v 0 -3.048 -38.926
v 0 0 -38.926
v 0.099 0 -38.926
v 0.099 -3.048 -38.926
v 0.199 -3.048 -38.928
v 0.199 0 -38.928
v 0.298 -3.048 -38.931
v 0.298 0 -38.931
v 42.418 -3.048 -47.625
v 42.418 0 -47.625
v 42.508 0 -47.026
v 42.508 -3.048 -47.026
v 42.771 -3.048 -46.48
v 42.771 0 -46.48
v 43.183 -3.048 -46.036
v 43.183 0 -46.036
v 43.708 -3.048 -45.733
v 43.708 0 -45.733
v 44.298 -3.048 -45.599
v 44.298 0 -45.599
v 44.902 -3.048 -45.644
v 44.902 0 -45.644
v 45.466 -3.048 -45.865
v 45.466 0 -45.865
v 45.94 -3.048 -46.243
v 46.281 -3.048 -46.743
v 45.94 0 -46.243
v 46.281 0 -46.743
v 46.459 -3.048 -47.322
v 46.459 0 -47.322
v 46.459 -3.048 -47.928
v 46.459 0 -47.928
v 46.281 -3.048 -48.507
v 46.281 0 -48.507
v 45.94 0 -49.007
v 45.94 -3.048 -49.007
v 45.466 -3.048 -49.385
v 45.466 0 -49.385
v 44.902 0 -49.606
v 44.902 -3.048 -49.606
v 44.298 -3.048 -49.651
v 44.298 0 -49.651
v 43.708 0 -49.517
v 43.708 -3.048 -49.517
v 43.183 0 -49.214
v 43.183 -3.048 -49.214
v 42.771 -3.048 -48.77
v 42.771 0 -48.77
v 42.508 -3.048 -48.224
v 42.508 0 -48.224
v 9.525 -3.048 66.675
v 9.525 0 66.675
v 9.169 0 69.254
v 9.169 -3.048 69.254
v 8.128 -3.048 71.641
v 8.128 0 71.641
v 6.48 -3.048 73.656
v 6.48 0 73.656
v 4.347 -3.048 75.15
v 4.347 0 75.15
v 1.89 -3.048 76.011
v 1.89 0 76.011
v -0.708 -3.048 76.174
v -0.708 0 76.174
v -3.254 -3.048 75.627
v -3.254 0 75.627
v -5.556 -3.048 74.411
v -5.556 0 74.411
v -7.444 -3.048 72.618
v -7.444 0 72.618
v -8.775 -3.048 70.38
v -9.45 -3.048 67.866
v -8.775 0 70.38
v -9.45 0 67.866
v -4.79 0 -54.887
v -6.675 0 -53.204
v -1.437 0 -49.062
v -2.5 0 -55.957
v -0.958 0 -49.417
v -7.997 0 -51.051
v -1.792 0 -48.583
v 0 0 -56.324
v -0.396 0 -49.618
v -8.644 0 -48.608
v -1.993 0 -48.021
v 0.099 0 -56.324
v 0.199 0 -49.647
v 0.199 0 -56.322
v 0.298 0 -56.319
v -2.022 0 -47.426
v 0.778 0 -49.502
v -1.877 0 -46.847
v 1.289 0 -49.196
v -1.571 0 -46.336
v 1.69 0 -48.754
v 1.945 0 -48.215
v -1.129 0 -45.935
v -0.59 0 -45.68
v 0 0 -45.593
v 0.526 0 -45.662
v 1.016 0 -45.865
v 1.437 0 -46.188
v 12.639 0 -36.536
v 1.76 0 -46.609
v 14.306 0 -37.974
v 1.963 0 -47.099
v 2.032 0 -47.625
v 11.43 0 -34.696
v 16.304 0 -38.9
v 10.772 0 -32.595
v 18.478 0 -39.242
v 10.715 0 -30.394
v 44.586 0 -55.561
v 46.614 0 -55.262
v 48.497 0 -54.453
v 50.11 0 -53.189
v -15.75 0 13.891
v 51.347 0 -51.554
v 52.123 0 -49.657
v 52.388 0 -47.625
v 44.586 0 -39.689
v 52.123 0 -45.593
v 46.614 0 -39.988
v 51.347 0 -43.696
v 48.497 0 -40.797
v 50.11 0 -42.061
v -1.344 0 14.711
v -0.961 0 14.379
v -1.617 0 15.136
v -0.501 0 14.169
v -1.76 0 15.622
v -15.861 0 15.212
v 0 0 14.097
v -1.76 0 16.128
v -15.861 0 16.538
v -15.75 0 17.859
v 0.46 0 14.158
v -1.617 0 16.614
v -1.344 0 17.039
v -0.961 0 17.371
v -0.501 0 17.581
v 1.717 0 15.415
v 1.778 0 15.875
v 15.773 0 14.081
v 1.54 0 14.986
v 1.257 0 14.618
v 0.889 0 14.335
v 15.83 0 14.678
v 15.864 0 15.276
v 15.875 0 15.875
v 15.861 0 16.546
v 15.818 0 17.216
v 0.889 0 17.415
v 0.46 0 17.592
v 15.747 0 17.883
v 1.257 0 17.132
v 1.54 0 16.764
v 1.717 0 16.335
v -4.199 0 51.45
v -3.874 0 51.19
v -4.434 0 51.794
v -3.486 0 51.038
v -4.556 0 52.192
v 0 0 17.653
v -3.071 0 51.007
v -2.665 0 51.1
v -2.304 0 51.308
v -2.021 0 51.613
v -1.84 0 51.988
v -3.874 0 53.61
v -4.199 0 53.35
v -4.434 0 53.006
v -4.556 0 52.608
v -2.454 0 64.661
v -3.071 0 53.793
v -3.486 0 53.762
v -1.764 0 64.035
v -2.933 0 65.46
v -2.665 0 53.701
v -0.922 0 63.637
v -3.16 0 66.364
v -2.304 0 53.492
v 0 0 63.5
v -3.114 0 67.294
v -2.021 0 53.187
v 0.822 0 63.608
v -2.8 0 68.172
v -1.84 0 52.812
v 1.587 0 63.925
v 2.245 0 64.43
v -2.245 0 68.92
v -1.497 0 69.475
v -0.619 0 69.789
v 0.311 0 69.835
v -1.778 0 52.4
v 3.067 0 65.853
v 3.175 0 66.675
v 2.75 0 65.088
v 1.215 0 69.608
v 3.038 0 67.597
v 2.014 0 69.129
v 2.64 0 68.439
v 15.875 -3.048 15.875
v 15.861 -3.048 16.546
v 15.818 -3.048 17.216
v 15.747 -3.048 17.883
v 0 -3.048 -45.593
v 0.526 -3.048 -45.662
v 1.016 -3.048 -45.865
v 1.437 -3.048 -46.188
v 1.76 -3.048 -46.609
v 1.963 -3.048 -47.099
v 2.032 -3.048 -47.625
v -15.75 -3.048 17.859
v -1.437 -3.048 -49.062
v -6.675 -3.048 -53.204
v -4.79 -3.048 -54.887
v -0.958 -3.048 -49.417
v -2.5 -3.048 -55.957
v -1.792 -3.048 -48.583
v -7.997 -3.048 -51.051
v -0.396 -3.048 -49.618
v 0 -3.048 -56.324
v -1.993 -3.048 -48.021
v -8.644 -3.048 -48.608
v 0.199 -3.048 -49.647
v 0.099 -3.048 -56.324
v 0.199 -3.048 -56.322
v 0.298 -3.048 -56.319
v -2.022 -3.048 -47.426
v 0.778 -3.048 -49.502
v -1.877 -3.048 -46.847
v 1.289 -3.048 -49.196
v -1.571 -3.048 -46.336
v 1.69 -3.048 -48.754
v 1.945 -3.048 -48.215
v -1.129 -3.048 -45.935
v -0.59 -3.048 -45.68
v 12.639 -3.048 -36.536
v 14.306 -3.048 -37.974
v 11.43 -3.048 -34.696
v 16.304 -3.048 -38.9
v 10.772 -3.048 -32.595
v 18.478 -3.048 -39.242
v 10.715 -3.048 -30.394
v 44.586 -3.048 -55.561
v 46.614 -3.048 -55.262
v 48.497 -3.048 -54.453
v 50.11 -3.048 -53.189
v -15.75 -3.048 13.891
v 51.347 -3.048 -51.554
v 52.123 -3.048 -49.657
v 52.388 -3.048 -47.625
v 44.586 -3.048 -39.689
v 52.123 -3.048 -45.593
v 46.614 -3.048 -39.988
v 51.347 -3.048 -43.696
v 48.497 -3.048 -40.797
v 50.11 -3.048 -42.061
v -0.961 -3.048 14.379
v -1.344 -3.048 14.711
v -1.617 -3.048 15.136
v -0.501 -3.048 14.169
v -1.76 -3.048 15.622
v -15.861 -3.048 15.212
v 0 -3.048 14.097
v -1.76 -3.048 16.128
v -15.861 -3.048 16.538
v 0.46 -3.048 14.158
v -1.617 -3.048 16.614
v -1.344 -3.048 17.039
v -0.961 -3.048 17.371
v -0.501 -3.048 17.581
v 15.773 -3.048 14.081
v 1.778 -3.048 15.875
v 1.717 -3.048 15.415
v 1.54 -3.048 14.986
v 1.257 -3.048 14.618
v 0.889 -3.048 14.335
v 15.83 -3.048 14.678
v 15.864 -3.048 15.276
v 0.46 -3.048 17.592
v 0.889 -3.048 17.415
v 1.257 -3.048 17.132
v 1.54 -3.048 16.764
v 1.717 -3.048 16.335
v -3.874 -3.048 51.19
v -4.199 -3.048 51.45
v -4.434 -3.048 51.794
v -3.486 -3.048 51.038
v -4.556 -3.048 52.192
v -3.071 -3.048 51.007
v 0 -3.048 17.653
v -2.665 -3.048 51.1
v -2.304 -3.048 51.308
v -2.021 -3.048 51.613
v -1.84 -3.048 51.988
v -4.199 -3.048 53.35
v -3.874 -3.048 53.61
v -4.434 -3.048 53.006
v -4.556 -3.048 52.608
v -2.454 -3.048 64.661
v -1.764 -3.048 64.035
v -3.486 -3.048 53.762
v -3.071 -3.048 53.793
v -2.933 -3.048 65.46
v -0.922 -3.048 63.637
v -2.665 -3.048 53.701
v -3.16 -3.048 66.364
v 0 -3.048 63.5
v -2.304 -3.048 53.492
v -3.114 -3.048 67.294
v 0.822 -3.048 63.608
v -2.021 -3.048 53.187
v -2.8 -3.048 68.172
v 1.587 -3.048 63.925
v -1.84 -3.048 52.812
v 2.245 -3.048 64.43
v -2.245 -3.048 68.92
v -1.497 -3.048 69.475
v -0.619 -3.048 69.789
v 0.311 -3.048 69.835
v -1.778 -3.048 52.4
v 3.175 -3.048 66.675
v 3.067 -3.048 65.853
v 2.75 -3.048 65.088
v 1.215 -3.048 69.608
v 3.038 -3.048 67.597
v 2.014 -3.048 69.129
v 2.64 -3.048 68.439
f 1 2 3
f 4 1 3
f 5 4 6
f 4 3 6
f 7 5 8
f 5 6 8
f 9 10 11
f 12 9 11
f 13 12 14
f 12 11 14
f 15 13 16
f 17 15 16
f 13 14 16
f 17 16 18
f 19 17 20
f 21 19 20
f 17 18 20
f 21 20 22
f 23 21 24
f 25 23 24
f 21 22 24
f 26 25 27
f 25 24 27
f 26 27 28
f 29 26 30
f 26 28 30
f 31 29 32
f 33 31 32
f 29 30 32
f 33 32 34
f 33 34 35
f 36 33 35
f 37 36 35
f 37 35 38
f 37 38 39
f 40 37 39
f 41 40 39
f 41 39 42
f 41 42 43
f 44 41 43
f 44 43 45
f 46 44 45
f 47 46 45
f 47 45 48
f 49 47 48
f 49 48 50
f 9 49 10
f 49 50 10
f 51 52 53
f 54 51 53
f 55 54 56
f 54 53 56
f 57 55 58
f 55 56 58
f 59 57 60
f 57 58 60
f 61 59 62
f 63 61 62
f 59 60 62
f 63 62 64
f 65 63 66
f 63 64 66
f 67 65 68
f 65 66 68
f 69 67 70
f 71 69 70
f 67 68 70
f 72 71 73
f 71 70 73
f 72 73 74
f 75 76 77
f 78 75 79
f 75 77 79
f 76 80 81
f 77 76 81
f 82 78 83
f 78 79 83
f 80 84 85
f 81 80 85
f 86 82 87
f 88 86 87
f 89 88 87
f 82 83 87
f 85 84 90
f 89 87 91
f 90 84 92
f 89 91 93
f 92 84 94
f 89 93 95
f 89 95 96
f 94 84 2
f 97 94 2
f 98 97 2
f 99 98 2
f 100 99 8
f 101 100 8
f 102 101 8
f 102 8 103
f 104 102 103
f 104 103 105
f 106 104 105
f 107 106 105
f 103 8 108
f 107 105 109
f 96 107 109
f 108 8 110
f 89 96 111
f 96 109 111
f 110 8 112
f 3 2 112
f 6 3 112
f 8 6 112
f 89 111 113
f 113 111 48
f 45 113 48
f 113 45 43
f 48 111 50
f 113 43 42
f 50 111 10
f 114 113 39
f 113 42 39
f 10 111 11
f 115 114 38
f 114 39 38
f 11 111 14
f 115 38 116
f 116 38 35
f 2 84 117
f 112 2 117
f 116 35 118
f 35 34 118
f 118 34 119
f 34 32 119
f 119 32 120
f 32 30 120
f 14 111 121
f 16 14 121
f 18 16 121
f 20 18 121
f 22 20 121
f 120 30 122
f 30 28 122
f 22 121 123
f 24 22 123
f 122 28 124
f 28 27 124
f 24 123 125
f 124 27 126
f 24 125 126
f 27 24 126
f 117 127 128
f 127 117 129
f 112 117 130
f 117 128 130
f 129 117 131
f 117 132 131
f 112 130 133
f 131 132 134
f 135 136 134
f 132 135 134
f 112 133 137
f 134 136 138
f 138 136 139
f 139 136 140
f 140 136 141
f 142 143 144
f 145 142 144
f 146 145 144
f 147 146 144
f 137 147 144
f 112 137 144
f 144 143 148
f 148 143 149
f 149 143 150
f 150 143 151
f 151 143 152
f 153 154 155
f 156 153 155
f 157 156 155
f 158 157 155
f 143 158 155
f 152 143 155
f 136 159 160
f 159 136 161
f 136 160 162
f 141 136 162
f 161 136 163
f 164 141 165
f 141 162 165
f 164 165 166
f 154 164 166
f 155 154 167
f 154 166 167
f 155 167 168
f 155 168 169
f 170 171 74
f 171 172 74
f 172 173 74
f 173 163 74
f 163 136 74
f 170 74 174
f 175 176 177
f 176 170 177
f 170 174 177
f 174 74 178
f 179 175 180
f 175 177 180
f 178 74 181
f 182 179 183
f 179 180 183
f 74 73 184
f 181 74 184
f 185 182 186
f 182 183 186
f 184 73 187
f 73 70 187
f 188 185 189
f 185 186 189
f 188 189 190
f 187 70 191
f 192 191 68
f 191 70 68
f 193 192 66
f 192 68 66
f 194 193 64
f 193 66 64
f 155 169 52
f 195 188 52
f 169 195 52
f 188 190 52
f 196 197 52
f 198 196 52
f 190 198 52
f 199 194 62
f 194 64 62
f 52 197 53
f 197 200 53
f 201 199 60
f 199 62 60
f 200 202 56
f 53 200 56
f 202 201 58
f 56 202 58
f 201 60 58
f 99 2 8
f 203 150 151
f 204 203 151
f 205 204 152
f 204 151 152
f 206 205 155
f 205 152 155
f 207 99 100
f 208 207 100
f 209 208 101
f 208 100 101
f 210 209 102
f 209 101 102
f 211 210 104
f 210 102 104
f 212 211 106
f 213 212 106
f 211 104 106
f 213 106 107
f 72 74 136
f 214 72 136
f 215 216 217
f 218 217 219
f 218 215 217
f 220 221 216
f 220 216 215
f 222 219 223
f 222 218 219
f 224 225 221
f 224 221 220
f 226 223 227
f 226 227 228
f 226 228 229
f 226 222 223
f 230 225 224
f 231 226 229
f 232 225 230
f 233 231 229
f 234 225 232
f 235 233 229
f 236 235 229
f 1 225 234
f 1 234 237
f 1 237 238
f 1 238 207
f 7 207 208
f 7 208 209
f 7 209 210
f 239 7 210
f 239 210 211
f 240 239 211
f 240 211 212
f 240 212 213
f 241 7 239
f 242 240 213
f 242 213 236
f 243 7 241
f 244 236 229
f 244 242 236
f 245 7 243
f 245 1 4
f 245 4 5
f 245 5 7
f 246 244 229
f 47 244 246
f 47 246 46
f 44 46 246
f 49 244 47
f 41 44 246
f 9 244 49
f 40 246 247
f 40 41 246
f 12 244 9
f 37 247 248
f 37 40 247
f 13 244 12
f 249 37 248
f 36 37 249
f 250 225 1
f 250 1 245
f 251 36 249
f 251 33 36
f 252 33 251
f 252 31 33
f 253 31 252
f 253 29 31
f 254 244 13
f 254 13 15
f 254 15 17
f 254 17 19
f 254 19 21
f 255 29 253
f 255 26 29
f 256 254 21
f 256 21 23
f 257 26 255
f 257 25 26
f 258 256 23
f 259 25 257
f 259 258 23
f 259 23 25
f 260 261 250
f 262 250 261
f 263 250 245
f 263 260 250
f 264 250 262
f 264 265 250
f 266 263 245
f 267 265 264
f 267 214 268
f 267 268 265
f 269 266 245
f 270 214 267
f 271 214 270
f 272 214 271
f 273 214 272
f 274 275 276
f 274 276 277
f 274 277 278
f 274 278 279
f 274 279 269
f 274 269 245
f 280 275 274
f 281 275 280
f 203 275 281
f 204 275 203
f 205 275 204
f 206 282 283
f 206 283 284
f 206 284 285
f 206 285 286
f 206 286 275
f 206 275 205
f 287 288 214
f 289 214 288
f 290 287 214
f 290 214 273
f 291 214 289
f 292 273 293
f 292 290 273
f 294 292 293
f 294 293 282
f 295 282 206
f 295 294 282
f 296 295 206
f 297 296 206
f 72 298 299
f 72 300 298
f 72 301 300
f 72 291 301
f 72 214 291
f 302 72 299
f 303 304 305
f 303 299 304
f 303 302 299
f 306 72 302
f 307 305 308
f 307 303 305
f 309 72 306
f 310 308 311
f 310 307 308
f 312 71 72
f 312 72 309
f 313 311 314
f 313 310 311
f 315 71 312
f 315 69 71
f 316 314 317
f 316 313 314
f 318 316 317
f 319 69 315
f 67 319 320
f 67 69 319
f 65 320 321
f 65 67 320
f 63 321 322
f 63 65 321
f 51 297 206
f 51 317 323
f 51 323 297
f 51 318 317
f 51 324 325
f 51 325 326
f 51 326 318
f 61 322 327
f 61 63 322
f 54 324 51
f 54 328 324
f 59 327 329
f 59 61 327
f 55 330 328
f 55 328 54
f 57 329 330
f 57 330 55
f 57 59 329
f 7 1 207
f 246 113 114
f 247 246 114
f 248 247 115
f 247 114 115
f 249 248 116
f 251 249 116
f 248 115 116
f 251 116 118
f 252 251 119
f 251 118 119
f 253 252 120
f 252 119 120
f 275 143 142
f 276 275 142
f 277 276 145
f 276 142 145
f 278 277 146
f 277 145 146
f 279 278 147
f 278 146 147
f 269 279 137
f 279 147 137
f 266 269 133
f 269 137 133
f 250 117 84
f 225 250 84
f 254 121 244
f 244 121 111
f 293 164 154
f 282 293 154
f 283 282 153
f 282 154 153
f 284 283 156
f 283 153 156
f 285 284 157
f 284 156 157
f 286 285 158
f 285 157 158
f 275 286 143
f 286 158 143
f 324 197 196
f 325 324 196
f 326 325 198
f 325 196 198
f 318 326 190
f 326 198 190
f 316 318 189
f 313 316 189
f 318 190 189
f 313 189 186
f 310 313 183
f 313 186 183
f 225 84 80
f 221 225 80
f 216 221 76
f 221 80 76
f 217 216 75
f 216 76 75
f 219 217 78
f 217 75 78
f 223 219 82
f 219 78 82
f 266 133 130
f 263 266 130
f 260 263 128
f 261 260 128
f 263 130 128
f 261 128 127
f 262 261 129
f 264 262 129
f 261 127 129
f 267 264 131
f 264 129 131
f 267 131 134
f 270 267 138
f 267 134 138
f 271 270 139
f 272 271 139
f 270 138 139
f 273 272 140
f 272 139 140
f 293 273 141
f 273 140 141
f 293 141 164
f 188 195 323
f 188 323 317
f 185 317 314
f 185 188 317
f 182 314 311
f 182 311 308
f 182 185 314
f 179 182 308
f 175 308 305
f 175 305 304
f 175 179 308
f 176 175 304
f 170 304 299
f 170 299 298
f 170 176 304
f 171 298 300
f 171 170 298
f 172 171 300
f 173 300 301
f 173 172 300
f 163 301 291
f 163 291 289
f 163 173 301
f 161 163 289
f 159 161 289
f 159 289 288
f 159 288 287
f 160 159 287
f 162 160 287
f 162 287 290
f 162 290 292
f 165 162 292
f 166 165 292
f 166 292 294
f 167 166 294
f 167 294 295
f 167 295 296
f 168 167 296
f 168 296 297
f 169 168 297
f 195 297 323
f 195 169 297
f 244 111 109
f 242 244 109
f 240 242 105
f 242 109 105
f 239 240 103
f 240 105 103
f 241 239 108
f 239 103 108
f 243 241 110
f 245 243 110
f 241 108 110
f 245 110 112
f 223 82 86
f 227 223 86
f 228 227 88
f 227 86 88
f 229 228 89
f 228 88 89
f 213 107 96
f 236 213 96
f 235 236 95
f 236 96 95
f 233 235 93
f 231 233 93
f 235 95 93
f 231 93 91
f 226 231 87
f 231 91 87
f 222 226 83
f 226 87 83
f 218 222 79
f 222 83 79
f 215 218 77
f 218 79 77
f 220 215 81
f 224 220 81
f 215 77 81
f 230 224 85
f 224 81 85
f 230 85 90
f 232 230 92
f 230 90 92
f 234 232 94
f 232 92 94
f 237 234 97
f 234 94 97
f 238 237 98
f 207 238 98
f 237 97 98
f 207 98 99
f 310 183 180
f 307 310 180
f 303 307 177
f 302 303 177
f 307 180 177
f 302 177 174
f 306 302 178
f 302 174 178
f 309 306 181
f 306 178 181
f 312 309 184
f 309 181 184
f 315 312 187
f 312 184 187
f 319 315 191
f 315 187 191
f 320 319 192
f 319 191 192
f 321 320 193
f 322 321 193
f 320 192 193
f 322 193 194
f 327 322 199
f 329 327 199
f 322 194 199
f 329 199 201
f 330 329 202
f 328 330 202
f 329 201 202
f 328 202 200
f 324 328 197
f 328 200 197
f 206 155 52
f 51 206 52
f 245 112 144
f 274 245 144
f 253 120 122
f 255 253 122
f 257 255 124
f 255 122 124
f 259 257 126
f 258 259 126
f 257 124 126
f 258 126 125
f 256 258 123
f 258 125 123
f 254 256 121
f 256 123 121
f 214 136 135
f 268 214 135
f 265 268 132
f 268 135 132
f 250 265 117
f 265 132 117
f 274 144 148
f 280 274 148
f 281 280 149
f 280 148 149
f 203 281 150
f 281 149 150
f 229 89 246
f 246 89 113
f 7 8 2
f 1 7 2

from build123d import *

# Parameters (mm, degrees)
F0_R     = 1.397
F1_DEPTH = 3.048


with BuildPart() as f1:
    # F0 (on Front) → F1 (new body)
    with BuildSketch(Plane.XZ):
        with BuildLine():
            ThreePointArc((3.175, 66.675), (-2.245064, 68.920064), (0, 63.5))
            ThreePointArc((0, 63.5), (2.245064, 64.429936), (3.175, 66.675))
        make_face()
        with BuildLine():
            ThreePointArc((0, 57.15), (6.735192, 59.939808), (9.525, 66.675))
            ThreePointArc((9.525, 66.675), (0.596483, 76.181305), (-9.450293, 67.865625))
            ThreePointArc((-9.450293, 67.865625), (-7.14375, 60.374805), (0, 57.15))
        make_face()
        with BuildLine():
            ThreePointArc((3.175, 66.675), (2.245064, 64.429936), (0, 63.5))
            ThreePointArc((0, 63.5), (-2.245064, 68.920064), (3.175, 66.675))
        make_face(mode=Mode.SUBTRACT)
        with BuildLine():
            Line((15.747457, 17.883289), (9.525, 66.675))
            ThreePointArc((9.525, 66.675), (6.735192, 59.939808), (0, 57.15))
            Line((0, 57.15), (0, 31.75))
            ThreePointArc((0, 31.75), (10.491283, 27.789219), (15.747457, 17.883289))
        make_face()
        with BuildLine():
            ThreePointArc((0, 57.15), (-7.14375, 60.374805), (-9.450293, 67.865625))
            Line((-9.450293, 67.865625), (-15.750488, 17.859375))
            ThreePointArc((-15.750488, 17.859375), (-10.500326, 27.78125), (0, 31.75))
            Line((0, 31.75), (0, 57.15))
        make_face()
        with Locations((-3.175, 52.4002)):
            Circle(F0_R, mode=Mode.SUBTRACT)
        with BuildLine():
            ThreePointArc((15.875, 15.875), (15.843082, 16.881168), (15.747457, 17.883289))
            ThreePointArc((15.747457, 17.883289), (10.491283, 27.789219), (0, 31.75))
            Line((0, 31.75), (0, 17.653))
            ThreePointArc((0, 17.653), (1.257236, 17.132236), (1.778, 15.875))
            ThreePointArc((1.778, 15.875), (1.257236, 14.617764), (0, 14.097))
            Line((0, 14.097), (0, 0))
            ThreePointArc((0, 0), (10.572083, 4.03242), (15.77332, 14.081125))
            ThreePointArc((15.77332, 14.081125), (15.84956, 14.976623), (15.875, 15.875))
        make_face()
        with BuildLine():
            ThreePointArc((0, 31.75), (-10.500326, 27.78125), (-15.750488, 17.859375))
            ThreePointArc((-15.750488, 17.859375), (-15.875, 15.875), (-15.750488, 13.890625))
            ThreePointArc((-15.750488, 13.890625), (-10.500326, 3.96875), (0, 0))
            Line((0, 0), (0, 14.097))
            ThreePointArc((0, 14.097), (-1.778, 15.875), (0, 17.653))
            Line((0, 17.653), (0, 31.75))
        make_face()
        with BuildLine():
            ThreePointArc((0, 0), (-10.500326, 3.96875), (-15.750488, 13.890625))
            Line((-15.750488, 13.890625), (-8.643798, -48.607884))
            ThreePointArc((-8.643798, -48.607884), (-6.48968, -41.831439), (0, -38.9255))
            Line((0, -38.9255), (0, 0))
        make_face()
        with BuildLine():
            Line((10.715191, -30.394381), (15.77332, 14.081125))
            ThreePointArc((15.77332, 14.081125), (10.572083, 4.03242), (0, 0))
            Line((0, 0), (0, -38.9255))
            ThreePointArc((0, -38.9255), (0.148885, -38.926774), (0.297726, -38.930596))
            ThreePointArc((0.297726, -38.930596), (6.255852, -41.579703), (8.6995, -47.625))
            Line((8.6995, -47.625), (36.5125, -47.625))
            ThreePointArc((36.5125, -47.625), (38.885575, -41.964516), (44.585844, -39.688663))
            Line((44.585844, -39.688663), (18.478408, -39.241789))
            ThreePointArc((18.478408, -39.241789), (12.638616, -36.536307), (10.715191, -30.394381))
        make_face()
        with BuildLine():
            ThreePointArc((0, -38.9255), (-6.48968, -41.831439), (-8.643798, -48.607884))
            ThreePointArc((-8.643798, -48.607884), (-5.793561, -54.11468), (0, -56.3245))
            Line((0, -56.3245), (0.297726, -56.319404))
            ThreePointArc((0.297726, -56.319404), (6.255852, -53.670297), (8.6995, -47.625))
            Line((8.6995, -47.625), (2.032, -47.625))
            ThreePointArc((2.032, -47.625), (-1.436841, -49.061841), (0, -45.593))
            Line((0, -45.593), (0, -38.9255))
        make_face()
        with BuildLine():
            Line((0.297726, -56.319404), (0, -56.3245))
            ThreePointArc((0, -56.3245), (0.148885, -56.323226), (0.297726, -56.319404))
        make_face()
        with BuildLine():
            ThreePointArc((8.6995, -47.625), (6.255852, -53.670297), (0.297726, -56.319404))
            Line((0.297726, -56.319404), (44.585844, -55.561337))
            ThreePointArc((44.585844, -55.561337), (38.885575, -53.285484), (36.5125, -47.625))
            Line((36.5125, -47.625), (8.6995, -47.625))
        make_face()
        with BuildLine():
            ThreePointArc((46.482, -47.625), (44.45, -45.593), (42.418, -47.625))
            ThreePointArc((42.418, -47.625), (44.45, -49.657), (46.482, -47.625))
        make_face()
        with BuildLine():
            ThreePointArc((52.3875, -47.625), (50.110484, -42.060575), (44.585844, -39.688663))
            ThreePointArc((44.585844, -39.688663), (38.885575, -41.964516), (36.5125, -47.625))
            ThreePointArc((36.5125, -47.625), (38.885575, -53.285484), (44.585844, -55.561337))
            ThreePointArc((44.585844, -55.561337), (50.110484, -53.189425), (52.3875, -47.625))
        make_face()
        with BuildLine():
            ThreePointArc((46.482, -47.625), (44.45, -49.657), (42.418, -47.625))
            ThreePointArc((42.418, -47.625), (44.45, -45.593), (46.482, -47.625))
        make_face(mode=Mode.SUBTRACT)
        with BuildLine():
            Line((0.297726, -38.930596), (0, -38.9255))
            Line((0, -38.9255), (0, -45.593))
            ThreePointArc((0, -45.593), (1.436841, -46.188159), (2.032, -47.625))
            Line((2.032, -47.625), (8.6995, -47.625))
            ThreePointArc((8.6995, -47.625), (6.255852, -41.579703), (0.297726, -38.930596))
        make_face()
    extrude(amount=F1_DEPTH)


solid = f1.part
